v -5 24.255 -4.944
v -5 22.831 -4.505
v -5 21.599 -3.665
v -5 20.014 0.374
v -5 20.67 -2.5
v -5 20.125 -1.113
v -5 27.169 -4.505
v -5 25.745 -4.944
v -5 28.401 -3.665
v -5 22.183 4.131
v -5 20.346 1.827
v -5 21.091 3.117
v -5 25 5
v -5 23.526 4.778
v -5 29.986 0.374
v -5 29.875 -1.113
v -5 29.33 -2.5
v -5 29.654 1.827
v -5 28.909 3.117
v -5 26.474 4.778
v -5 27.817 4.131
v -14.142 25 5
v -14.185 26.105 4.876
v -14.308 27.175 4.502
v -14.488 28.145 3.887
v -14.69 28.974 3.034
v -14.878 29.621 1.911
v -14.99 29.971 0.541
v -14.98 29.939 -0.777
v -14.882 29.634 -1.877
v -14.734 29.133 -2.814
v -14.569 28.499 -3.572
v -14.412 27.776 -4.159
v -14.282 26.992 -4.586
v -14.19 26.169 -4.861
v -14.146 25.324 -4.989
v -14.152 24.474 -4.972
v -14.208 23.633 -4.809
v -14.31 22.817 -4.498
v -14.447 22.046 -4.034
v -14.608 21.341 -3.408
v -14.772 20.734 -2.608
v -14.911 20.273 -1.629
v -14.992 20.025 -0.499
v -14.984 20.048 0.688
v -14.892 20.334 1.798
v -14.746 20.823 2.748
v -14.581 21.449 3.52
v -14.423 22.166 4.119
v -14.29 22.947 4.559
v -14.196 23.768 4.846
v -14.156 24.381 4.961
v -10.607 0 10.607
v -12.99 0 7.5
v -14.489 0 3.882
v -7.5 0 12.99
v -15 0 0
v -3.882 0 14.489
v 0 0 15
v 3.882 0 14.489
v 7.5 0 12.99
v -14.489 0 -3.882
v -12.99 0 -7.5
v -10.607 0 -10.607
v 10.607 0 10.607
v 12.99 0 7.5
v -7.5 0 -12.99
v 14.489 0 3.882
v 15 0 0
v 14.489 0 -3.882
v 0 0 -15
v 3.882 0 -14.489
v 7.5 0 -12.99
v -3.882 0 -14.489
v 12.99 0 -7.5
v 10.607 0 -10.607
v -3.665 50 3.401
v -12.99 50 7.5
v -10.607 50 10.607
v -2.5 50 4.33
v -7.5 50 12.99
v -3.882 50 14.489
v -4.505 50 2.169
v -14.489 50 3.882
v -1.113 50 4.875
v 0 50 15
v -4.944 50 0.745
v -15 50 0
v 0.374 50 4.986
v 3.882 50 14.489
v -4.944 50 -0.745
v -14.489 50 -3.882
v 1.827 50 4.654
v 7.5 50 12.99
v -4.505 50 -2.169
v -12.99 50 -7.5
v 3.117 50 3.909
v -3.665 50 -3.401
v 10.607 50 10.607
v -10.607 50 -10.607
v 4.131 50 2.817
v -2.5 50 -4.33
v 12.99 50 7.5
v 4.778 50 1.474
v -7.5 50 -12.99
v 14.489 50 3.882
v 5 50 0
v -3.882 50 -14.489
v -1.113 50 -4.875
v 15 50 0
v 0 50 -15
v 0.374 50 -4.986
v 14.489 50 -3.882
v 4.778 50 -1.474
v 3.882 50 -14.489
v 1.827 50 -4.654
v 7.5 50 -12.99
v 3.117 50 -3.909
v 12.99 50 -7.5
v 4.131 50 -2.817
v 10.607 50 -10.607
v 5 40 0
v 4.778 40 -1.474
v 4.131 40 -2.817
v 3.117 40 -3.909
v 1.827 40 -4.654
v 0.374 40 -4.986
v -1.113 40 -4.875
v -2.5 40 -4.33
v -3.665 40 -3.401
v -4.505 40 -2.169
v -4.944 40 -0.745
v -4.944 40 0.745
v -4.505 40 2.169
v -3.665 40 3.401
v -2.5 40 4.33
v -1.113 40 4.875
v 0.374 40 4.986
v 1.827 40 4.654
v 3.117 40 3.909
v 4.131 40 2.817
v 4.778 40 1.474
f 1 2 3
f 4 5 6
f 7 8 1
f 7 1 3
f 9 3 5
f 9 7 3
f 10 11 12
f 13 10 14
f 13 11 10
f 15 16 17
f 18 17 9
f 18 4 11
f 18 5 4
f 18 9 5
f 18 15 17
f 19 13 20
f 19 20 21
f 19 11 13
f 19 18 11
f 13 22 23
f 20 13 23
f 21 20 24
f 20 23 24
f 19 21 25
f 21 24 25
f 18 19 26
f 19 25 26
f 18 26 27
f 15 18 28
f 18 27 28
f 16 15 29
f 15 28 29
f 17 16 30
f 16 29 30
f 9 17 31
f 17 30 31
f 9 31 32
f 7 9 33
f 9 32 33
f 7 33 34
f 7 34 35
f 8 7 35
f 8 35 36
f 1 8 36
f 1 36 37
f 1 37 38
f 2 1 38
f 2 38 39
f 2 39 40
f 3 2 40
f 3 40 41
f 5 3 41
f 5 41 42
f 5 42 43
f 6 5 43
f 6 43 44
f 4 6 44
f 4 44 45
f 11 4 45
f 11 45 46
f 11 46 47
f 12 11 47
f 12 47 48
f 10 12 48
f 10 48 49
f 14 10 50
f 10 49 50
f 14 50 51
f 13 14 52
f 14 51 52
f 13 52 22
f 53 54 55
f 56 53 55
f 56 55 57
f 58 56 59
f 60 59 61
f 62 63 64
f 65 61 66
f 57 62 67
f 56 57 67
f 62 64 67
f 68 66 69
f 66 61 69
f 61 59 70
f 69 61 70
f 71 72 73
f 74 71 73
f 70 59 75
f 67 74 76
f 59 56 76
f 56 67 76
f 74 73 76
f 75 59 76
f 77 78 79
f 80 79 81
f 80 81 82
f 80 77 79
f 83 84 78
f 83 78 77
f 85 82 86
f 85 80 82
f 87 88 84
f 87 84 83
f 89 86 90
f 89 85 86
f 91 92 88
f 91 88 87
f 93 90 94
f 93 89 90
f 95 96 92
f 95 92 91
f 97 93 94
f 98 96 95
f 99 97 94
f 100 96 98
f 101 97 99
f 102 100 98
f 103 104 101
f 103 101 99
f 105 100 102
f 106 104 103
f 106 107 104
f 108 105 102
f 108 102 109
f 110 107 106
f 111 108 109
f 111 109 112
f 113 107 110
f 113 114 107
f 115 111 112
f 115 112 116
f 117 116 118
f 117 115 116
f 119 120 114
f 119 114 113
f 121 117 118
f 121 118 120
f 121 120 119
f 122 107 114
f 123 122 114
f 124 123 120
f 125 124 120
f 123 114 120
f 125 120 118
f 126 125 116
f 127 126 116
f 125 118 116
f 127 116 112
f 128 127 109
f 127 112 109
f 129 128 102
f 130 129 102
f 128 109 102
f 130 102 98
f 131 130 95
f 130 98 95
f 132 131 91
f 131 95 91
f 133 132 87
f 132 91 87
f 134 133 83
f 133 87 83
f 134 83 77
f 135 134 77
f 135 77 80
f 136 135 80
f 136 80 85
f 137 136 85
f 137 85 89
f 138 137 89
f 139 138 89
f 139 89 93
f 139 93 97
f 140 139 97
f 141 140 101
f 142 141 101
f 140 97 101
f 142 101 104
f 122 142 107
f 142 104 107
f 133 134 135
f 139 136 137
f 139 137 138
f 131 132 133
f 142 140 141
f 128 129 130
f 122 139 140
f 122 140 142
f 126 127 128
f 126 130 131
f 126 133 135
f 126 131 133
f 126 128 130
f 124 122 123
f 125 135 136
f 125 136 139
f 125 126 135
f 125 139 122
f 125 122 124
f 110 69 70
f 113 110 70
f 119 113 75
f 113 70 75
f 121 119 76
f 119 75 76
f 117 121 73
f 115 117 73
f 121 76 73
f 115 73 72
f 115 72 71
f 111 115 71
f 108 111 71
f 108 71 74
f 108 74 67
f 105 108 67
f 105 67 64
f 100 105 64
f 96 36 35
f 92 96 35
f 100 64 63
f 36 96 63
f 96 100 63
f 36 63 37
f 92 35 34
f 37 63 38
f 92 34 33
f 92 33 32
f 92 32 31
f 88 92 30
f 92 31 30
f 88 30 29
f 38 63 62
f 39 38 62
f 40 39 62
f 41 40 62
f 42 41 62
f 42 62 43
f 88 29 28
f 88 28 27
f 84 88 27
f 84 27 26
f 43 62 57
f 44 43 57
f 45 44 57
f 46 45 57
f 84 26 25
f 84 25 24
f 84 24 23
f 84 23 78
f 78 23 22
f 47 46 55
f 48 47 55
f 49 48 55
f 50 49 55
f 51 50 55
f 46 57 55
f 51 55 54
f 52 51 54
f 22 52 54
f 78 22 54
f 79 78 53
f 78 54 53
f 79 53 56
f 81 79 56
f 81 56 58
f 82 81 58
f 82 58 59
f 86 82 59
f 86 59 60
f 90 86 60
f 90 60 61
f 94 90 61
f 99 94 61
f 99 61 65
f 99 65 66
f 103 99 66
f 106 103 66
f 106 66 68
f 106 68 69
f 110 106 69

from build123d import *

# Parameters (mm, degrees)
SKETCH1_R           = 15
BOSS_EXTRUDE1_DEPTH = 50
SKETCH2_R           = 5
CUT_EXTRUDE1_DEPTH  = 20
SKETCH3_R           = 5
CUT_EXTRUDE2_DEPTH  = 10


with BuildPart() as part:
    # Sketch1 → Boss-Extrude1 (new body)
    with BuildSketch(Plane(origin=(0, 0, 0), x_dir=(1, 0, 0), z_dir=(0, 1, 0))):
        Circle(SKETCH1_R)
    extrude(amount=BOSS_EXTRUDE1_DEPTH)

    # Sketch2 → Cut-Extrude1 (cut)
    with BuildSketch(Plane.ZY.offset(25)):
        with Locations((0, 25)):
            Circle(SKETCH2_R)
    extrude(amount=-CUT_EXTRUDE1_DEPTH, mode=Mode.SUBTRACT)

    # Sketch3 → Cut-Extrude2 (cut)
    with BuildSketch(Plane(origin=(0, 50, 0), x_dir=(1, 0, 0), z_dir=(0, 1, 0))):
        Circle(SKETCH3_R)
    extrude(amount=-CUT_EXTRUDE2_DEPTH, mode=Mode.SUBTRACT)


solid = part.part
